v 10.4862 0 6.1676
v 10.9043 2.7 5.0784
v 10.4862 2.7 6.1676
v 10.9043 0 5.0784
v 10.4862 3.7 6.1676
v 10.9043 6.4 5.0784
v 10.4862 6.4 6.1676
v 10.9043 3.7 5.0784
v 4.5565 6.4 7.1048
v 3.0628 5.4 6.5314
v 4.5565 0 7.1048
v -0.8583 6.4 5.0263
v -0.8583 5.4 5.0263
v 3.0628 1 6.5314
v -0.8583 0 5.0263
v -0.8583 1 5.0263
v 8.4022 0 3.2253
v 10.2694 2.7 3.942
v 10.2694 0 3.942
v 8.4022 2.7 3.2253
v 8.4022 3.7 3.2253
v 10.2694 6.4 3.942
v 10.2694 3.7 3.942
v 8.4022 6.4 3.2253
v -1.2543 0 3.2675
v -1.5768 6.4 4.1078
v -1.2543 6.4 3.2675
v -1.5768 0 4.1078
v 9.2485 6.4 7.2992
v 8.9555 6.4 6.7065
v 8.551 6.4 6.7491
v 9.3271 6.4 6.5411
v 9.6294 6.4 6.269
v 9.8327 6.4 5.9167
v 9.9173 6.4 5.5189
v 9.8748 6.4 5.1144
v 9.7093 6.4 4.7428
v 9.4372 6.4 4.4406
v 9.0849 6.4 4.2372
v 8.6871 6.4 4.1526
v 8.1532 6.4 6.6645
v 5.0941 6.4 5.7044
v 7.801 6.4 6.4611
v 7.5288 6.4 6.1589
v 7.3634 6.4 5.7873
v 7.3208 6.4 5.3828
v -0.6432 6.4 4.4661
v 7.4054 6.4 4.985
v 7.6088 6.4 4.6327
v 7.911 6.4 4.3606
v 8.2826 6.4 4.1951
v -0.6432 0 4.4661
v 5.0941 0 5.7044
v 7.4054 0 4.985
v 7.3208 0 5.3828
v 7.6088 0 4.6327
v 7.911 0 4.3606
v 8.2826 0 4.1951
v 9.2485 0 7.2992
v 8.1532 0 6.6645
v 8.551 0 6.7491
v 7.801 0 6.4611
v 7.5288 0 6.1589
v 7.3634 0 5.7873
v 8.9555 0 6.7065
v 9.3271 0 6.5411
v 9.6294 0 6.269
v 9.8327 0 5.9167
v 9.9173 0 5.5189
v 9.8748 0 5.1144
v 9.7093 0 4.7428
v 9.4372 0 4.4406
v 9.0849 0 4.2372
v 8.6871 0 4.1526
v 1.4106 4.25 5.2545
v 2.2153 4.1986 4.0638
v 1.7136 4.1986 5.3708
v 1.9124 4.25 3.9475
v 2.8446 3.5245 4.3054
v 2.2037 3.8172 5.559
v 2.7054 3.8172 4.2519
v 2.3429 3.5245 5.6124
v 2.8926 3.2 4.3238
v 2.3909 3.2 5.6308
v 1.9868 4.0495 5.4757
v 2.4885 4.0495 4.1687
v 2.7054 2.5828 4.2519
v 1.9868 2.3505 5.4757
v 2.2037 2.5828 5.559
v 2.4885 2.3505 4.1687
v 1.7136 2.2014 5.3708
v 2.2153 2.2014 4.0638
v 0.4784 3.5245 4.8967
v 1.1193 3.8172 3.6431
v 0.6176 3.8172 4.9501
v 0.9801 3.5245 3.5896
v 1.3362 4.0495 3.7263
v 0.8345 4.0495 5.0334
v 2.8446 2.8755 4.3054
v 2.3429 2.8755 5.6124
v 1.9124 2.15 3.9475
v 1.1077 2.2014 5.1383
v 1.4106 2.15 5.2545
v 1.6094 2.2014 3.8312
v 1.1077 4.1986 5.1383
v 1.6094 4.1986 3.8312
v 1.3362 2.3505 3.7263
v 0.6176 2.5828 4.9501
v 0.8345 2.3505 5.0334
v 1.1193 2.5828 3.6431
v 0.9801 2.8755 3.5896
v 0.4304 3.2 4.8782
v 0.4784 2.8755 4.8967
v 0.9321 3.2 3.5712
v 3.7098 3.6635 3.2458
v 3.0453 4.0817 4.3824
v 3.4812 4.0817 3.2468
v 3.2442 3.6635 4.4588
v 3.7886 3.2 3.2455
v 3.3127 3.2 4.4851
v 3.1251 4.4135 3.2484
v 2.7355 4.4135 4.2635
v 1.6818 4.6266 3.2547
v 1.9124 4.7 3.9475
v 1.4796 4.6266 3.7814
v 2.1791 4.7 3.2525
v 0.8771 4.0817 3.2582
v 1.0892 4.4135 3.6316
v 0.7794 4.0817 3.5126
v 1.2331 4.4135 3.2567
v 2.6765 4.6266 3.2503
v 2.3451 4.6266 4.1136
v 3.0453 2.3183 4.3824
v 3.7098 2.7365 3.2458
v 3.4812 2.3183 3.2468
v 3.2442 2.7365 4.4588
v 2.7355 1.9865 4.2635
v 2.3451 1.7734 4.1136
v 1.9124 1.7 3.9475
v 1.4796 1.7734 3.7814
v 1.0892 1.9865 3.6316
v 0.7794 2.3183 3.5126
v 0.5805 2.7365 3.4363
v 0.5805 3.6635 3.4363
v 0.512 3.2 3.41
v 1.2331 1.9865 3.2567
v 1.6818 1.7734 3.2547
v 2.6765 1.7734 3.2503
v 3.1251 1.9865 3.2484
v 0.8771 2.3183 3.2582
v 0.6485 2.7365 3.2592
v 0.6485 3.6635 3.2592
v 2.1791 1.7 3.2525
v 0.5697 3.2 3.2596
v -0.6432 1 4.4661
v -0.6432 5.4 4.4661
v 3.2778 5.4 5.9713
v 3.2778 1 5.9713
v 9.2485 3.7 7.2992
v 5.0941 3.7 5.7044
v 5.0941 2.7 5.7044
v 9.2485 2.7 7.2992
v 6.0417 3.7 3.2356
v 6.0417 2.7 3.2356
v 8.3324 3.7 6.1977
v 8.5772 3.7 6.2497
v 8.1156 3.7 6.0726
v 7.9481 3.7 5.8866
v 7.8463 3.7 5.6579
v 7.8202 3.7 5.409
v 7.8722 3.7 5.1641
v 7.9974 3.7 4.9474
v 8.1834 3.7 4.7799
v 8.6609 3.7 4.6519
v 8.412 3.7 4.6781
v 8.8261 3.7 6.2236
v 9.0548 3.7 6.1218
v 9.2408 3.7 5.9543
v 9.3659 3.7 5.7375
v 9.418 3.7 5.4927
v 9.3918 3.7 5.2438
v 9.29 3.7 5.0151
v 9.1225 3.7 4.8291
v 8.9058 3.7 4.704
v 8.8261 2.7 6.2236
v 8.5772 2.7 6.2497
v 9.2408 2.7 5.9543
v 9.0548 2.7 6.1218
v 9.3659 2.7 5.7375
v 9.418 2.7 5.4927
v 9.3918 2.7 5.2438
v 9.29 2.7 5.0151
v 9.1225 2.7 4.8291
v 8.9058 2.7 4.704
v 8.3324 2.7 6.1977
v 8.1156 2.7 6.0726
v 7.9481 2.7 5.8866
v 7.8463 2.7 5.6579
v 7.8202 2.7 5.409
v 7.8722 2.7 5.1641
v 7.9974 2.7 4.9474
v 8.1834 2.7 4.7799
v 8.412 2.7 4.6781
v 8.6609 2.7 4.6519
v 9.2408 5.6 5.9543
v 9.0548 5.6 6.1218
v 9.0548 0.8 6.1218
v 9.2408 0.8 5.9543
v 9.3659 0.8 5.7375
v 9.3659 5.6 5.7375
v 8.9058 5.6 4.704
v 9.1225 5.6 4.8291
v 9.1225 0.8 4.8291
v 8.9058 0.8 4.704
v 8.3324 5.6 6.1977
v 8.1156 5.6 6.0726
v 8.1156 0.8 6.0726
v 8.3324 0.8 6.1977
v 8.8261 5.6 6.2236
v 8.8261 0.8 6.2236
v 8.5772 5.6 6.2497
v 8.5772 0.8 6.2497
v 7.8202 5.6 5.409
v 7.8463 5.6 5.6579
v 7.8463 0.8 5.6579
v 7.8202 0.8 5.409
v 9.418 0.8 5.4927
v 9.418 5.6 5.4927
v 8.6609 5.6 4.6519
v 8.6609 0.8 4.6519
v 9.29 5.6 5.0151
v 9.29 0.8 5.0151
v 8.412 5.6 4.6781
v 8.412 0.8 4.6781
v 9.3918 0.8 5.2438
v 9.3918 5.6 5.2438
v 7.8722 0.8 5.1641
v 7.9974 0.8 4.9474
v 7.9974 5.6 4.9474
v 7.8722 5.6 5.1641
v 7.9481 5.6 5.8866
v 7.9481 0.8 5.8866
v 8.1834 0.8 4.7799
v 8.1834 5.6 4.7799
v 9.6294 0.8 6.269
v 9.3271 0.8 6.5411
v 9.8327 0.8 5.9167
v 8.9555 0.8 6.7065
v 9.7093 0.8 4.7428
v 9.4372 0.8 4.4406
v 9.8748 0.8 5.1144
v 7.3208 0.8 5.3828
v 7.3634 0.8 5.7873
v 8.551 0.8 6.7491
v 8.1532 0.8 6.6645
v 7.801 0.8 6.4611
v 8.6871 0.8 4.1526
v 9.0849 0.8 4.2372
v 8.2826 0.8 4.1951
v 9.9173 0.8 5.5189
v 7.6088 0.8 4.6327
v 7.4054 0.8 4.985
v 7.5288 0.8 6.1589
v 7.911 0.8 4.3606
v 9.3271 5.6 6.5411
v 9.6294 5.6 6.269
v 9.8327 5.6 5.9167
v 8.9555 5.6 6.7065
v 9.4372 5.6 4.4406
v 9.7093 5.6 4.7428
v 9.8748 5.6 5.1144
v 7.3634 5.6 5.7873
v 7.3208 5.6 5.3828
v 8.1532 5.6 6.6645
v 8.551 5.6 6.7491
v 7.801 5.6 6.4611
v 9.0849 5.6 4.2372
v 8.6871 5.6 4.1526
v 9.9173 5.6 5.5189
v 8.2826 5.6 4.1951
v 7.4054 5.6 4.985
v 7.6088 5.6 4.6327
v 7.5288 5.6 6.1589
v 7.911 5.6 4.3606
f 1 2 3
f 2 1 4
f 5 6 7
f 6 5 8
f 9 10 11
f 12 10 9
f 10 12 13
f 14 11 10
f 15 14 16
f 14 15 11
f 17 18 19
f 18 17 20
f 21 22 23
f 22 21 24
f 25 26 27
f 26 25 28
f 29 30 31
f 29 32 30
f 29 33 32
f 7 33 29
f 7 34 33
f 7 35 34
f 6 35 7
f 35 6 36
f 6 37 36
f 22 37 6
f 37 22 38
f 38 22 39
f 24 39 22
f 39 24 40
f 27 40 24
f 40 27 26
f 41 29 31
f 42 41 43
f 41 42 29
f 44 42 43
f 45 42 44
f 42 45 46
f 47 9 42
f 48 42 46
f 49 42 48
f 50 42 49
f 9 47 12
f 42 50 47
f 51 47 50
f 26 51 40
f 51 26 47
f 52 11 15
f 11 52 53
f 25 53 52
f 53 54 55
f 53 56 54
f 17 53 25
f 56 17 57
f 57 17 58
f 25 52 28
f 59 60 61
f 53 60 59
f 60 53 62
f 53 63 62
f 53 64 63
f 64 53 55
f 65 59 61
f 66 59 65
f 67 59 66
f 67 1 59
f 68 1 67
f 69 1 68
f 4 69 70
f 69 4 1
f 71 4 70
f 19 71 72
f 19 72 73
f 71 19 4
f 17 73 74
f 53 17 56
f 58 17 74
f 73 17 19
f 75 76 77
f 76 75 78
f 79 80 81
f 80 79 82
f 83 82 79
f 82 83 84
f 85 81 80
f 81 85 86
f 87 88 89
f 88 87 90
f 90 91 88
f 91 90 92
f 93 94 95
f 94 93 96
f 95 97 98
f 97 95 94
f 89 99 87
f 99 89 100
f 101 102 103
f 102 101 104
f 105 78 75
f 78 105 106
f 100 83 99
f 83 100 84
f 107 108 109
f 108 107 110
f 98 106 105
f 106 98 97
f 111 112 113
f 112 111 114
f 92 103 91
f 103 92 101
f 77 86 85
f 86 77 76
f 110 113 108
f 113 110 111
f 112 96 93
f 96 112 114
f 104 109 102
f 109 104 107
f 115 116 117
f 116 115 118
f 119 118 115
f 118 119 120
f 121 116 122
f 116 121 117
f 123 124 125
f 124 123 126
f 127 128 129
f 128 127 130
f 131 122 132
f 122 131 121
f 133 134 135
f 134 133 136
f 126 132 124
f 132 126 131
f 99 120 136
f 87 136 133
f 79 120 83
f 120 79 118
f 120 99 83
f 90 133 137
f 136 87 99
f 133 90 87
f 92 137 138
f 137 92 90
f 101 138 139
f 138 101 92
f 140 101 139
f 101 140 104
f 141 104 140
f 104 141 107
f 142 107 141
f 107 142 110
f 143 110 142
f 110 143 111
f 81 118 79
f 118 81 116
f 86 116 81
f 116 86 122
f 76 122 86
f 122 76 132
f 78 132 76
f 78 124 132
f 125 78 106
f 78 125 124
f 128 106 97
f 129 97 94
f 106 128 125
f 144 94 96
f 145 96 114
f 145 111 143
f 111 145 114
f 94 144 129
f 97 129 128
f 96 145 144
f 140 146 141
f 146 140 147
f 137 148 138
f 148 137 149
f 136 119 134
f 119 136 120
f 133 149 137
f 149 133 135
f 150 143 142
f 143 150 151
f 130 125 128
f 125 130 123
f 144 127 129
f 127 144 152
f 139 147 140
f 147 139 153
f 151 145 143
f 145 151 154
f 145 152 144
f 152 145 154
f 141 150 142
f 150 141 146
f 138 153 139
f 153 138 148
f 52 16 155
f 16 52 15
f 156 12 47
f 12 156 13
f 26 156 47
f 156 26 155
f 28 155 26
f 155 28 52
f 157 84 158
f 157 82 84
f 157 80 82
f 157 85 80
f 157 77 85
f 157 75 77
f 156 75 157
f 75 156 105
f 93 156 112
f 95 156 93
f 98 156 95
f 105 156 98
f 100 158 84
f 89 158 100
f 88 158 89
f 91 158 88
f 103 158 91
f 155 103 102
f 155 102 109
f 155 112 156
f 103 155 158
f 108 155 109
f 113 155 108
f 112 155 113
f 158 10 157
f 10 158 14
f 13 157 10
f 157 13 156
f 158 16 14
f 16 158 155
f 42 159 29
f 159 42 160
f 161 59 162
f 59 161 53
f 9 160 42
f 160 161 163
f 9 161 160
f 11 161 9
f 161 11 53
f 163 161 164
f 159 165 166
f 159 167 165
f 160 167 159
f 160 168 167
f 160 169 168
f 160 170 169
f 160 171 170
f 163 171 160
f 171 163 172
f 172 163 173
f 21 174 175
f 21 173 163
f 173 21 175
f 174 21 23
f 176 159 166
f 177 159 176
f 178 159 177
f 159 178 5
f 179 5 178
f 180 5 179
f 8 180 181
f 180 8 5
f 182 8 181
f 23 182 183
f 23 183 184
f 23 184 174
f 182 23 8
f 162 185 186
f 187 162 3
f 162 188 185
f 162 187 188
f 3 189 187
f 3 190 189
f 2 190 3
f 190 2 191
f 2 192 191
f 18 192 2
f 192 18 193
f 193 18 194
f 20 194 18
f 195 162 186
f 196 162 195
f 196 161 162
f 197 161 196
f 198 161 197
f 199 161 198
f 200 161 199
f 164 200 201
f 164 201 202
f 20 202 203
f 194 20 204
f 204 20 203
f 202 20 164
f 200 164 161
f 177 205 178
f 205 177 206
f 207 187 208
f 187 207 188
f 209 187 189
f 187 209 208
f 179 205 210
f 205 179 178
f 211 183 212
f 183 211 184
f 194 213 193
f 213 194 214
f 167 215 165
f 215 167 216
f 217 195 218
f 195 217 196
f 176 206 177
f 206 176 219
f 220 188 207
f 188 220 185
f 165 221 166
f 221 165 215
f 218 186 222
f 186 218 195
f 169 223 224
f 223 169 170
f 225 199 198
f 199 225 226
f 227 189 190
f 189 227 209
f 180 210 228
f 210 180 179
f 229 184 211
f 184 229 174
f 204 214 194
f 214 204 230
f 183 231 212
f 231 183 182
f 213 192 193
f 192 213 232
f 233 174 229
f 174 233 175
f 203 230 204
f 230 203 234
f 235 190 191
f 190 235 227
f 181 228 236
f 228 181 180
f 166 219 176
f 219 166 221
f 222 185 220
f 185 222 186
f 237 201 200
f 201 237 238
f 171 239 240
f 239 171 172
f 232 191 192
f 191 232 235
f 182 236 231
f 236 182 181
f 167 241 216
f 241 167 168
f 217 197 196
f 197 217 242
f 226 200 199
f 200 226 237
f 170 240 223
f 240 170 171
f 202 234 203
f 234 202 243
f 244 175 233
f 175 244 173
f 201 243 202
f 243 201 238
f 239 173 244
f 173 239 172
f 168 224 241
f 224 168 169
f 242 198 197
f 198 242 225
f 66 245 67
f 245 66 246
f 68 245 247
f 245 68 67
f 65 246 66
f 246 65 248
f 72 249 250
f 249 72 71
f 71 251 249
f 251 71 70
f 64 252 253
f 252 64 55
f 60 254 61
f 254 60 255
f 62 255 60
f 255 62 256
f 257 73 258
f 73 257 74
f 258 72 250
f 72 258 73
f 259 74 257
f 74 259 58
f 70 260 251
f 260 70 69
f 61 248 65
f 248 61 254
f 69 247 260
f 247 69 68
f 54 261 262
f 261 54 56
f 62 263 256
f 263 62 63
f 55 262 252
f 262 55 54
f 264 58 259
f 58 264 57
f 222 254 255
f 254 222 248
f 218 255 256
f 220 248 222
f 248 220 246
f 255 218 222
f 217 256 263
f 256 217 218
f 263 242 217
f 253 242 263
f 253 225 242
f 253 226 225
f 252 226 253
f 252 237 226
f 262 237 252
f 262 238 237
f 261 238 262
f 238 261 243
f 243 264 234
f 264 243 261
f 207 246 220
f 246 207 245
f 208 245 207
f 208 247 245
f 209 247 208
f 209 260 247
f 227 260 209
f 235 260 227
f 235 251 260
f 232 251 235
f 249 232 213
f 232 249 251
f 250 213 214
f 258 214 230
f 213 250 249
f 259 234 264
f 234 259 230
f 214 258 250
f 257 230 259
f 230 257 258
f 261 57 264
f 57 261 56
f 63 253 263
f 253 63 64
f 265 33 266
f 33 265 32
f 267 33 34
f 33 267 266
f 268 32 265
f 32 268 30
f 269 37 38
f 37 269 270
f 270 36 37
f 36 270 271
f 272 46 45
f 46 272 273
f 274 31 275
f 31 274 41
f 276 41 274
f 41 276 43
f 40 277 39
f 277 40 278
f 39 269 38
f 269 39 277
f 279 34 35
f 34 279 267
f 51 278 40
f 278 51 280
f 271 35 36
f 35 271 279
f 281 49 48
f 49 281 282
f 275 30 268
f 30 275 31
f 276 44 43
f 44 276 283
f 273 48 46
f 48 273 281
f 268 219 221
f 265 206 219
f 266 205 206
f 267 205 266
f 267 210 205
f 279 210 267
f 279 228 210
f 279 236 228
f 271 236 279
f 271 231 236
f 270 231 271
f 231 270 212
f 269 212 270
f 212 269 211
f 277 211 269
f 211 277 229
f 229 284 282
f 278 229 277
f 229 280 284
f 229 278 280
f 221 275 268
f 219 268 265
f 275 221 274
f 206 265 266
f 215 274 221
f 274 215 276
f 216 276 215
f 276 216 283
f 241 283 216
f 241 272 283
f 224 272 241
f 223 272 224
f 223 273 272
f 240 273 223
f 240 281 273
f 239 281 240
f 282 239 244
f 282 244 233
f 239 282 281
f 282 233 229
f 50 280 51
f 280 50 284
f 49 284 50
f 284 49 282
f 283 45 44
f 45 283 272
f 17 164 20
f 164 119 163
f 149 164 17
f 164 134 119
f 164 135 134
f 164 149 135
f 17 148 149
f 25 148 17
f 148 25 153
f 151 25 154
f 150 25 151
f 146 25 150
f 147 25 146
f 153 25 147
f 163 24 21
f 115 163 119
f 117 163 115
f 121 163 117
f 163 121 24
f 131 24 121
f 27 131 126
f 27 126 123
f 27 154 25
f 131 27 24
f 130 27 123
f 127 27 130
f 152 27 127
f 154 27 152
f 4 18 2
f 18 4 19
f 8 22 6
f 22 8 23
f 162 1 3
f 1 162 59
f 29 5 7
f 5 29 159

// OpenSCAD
module piece() {
    difference() {
        cube([12,6.4,5]);
        translate([2.0+1.2,6.4/2,0]) cylinder(30,d=2.1,$fn=20,center=true);
        translate([2.0+1.2,6.4/2,0]) cylinder(3.0,d=3,$fn=20);
        translate([0,0,4.4]) cube([1,20,20]);
        translate([0,1,4.4]) cube([5.2,4.4,1]);
        ///translate([0,1,1.4]) cube([5,4.4,2]);
        translate([6.8,-1,3.5]) cube([20,20,2]);
        translate([6.8,(6.4-1)/2,-1]) cube([20,1,20]);
        rotate([90,0,0]) translate([10,2,0]) cylinder(30,d=1.6,$fn=20,center=true);
        rotate([90,0,0]) translate([10,2,-0.8]) cylinder(1,d=2.6,$fn=20);
        rotate([90,0,0]) translate([10,2,-6.6]) cylinder(1,d=2.6,$fn=20);
        
        rotate([-90,0,0]) translate([0,-5,0])
        linear_extrude(20) {
            polygon([[0,1.5], [9,5], [11,5], 
            [12.2,4], [12,3], [11,1], [12,1], [13,0], [13,10], [0,10]]);
        }
    }
}

rotate([0,-21,0]) piece();

//translate([0,20,0]) scale([-1,1,1]) piece();
